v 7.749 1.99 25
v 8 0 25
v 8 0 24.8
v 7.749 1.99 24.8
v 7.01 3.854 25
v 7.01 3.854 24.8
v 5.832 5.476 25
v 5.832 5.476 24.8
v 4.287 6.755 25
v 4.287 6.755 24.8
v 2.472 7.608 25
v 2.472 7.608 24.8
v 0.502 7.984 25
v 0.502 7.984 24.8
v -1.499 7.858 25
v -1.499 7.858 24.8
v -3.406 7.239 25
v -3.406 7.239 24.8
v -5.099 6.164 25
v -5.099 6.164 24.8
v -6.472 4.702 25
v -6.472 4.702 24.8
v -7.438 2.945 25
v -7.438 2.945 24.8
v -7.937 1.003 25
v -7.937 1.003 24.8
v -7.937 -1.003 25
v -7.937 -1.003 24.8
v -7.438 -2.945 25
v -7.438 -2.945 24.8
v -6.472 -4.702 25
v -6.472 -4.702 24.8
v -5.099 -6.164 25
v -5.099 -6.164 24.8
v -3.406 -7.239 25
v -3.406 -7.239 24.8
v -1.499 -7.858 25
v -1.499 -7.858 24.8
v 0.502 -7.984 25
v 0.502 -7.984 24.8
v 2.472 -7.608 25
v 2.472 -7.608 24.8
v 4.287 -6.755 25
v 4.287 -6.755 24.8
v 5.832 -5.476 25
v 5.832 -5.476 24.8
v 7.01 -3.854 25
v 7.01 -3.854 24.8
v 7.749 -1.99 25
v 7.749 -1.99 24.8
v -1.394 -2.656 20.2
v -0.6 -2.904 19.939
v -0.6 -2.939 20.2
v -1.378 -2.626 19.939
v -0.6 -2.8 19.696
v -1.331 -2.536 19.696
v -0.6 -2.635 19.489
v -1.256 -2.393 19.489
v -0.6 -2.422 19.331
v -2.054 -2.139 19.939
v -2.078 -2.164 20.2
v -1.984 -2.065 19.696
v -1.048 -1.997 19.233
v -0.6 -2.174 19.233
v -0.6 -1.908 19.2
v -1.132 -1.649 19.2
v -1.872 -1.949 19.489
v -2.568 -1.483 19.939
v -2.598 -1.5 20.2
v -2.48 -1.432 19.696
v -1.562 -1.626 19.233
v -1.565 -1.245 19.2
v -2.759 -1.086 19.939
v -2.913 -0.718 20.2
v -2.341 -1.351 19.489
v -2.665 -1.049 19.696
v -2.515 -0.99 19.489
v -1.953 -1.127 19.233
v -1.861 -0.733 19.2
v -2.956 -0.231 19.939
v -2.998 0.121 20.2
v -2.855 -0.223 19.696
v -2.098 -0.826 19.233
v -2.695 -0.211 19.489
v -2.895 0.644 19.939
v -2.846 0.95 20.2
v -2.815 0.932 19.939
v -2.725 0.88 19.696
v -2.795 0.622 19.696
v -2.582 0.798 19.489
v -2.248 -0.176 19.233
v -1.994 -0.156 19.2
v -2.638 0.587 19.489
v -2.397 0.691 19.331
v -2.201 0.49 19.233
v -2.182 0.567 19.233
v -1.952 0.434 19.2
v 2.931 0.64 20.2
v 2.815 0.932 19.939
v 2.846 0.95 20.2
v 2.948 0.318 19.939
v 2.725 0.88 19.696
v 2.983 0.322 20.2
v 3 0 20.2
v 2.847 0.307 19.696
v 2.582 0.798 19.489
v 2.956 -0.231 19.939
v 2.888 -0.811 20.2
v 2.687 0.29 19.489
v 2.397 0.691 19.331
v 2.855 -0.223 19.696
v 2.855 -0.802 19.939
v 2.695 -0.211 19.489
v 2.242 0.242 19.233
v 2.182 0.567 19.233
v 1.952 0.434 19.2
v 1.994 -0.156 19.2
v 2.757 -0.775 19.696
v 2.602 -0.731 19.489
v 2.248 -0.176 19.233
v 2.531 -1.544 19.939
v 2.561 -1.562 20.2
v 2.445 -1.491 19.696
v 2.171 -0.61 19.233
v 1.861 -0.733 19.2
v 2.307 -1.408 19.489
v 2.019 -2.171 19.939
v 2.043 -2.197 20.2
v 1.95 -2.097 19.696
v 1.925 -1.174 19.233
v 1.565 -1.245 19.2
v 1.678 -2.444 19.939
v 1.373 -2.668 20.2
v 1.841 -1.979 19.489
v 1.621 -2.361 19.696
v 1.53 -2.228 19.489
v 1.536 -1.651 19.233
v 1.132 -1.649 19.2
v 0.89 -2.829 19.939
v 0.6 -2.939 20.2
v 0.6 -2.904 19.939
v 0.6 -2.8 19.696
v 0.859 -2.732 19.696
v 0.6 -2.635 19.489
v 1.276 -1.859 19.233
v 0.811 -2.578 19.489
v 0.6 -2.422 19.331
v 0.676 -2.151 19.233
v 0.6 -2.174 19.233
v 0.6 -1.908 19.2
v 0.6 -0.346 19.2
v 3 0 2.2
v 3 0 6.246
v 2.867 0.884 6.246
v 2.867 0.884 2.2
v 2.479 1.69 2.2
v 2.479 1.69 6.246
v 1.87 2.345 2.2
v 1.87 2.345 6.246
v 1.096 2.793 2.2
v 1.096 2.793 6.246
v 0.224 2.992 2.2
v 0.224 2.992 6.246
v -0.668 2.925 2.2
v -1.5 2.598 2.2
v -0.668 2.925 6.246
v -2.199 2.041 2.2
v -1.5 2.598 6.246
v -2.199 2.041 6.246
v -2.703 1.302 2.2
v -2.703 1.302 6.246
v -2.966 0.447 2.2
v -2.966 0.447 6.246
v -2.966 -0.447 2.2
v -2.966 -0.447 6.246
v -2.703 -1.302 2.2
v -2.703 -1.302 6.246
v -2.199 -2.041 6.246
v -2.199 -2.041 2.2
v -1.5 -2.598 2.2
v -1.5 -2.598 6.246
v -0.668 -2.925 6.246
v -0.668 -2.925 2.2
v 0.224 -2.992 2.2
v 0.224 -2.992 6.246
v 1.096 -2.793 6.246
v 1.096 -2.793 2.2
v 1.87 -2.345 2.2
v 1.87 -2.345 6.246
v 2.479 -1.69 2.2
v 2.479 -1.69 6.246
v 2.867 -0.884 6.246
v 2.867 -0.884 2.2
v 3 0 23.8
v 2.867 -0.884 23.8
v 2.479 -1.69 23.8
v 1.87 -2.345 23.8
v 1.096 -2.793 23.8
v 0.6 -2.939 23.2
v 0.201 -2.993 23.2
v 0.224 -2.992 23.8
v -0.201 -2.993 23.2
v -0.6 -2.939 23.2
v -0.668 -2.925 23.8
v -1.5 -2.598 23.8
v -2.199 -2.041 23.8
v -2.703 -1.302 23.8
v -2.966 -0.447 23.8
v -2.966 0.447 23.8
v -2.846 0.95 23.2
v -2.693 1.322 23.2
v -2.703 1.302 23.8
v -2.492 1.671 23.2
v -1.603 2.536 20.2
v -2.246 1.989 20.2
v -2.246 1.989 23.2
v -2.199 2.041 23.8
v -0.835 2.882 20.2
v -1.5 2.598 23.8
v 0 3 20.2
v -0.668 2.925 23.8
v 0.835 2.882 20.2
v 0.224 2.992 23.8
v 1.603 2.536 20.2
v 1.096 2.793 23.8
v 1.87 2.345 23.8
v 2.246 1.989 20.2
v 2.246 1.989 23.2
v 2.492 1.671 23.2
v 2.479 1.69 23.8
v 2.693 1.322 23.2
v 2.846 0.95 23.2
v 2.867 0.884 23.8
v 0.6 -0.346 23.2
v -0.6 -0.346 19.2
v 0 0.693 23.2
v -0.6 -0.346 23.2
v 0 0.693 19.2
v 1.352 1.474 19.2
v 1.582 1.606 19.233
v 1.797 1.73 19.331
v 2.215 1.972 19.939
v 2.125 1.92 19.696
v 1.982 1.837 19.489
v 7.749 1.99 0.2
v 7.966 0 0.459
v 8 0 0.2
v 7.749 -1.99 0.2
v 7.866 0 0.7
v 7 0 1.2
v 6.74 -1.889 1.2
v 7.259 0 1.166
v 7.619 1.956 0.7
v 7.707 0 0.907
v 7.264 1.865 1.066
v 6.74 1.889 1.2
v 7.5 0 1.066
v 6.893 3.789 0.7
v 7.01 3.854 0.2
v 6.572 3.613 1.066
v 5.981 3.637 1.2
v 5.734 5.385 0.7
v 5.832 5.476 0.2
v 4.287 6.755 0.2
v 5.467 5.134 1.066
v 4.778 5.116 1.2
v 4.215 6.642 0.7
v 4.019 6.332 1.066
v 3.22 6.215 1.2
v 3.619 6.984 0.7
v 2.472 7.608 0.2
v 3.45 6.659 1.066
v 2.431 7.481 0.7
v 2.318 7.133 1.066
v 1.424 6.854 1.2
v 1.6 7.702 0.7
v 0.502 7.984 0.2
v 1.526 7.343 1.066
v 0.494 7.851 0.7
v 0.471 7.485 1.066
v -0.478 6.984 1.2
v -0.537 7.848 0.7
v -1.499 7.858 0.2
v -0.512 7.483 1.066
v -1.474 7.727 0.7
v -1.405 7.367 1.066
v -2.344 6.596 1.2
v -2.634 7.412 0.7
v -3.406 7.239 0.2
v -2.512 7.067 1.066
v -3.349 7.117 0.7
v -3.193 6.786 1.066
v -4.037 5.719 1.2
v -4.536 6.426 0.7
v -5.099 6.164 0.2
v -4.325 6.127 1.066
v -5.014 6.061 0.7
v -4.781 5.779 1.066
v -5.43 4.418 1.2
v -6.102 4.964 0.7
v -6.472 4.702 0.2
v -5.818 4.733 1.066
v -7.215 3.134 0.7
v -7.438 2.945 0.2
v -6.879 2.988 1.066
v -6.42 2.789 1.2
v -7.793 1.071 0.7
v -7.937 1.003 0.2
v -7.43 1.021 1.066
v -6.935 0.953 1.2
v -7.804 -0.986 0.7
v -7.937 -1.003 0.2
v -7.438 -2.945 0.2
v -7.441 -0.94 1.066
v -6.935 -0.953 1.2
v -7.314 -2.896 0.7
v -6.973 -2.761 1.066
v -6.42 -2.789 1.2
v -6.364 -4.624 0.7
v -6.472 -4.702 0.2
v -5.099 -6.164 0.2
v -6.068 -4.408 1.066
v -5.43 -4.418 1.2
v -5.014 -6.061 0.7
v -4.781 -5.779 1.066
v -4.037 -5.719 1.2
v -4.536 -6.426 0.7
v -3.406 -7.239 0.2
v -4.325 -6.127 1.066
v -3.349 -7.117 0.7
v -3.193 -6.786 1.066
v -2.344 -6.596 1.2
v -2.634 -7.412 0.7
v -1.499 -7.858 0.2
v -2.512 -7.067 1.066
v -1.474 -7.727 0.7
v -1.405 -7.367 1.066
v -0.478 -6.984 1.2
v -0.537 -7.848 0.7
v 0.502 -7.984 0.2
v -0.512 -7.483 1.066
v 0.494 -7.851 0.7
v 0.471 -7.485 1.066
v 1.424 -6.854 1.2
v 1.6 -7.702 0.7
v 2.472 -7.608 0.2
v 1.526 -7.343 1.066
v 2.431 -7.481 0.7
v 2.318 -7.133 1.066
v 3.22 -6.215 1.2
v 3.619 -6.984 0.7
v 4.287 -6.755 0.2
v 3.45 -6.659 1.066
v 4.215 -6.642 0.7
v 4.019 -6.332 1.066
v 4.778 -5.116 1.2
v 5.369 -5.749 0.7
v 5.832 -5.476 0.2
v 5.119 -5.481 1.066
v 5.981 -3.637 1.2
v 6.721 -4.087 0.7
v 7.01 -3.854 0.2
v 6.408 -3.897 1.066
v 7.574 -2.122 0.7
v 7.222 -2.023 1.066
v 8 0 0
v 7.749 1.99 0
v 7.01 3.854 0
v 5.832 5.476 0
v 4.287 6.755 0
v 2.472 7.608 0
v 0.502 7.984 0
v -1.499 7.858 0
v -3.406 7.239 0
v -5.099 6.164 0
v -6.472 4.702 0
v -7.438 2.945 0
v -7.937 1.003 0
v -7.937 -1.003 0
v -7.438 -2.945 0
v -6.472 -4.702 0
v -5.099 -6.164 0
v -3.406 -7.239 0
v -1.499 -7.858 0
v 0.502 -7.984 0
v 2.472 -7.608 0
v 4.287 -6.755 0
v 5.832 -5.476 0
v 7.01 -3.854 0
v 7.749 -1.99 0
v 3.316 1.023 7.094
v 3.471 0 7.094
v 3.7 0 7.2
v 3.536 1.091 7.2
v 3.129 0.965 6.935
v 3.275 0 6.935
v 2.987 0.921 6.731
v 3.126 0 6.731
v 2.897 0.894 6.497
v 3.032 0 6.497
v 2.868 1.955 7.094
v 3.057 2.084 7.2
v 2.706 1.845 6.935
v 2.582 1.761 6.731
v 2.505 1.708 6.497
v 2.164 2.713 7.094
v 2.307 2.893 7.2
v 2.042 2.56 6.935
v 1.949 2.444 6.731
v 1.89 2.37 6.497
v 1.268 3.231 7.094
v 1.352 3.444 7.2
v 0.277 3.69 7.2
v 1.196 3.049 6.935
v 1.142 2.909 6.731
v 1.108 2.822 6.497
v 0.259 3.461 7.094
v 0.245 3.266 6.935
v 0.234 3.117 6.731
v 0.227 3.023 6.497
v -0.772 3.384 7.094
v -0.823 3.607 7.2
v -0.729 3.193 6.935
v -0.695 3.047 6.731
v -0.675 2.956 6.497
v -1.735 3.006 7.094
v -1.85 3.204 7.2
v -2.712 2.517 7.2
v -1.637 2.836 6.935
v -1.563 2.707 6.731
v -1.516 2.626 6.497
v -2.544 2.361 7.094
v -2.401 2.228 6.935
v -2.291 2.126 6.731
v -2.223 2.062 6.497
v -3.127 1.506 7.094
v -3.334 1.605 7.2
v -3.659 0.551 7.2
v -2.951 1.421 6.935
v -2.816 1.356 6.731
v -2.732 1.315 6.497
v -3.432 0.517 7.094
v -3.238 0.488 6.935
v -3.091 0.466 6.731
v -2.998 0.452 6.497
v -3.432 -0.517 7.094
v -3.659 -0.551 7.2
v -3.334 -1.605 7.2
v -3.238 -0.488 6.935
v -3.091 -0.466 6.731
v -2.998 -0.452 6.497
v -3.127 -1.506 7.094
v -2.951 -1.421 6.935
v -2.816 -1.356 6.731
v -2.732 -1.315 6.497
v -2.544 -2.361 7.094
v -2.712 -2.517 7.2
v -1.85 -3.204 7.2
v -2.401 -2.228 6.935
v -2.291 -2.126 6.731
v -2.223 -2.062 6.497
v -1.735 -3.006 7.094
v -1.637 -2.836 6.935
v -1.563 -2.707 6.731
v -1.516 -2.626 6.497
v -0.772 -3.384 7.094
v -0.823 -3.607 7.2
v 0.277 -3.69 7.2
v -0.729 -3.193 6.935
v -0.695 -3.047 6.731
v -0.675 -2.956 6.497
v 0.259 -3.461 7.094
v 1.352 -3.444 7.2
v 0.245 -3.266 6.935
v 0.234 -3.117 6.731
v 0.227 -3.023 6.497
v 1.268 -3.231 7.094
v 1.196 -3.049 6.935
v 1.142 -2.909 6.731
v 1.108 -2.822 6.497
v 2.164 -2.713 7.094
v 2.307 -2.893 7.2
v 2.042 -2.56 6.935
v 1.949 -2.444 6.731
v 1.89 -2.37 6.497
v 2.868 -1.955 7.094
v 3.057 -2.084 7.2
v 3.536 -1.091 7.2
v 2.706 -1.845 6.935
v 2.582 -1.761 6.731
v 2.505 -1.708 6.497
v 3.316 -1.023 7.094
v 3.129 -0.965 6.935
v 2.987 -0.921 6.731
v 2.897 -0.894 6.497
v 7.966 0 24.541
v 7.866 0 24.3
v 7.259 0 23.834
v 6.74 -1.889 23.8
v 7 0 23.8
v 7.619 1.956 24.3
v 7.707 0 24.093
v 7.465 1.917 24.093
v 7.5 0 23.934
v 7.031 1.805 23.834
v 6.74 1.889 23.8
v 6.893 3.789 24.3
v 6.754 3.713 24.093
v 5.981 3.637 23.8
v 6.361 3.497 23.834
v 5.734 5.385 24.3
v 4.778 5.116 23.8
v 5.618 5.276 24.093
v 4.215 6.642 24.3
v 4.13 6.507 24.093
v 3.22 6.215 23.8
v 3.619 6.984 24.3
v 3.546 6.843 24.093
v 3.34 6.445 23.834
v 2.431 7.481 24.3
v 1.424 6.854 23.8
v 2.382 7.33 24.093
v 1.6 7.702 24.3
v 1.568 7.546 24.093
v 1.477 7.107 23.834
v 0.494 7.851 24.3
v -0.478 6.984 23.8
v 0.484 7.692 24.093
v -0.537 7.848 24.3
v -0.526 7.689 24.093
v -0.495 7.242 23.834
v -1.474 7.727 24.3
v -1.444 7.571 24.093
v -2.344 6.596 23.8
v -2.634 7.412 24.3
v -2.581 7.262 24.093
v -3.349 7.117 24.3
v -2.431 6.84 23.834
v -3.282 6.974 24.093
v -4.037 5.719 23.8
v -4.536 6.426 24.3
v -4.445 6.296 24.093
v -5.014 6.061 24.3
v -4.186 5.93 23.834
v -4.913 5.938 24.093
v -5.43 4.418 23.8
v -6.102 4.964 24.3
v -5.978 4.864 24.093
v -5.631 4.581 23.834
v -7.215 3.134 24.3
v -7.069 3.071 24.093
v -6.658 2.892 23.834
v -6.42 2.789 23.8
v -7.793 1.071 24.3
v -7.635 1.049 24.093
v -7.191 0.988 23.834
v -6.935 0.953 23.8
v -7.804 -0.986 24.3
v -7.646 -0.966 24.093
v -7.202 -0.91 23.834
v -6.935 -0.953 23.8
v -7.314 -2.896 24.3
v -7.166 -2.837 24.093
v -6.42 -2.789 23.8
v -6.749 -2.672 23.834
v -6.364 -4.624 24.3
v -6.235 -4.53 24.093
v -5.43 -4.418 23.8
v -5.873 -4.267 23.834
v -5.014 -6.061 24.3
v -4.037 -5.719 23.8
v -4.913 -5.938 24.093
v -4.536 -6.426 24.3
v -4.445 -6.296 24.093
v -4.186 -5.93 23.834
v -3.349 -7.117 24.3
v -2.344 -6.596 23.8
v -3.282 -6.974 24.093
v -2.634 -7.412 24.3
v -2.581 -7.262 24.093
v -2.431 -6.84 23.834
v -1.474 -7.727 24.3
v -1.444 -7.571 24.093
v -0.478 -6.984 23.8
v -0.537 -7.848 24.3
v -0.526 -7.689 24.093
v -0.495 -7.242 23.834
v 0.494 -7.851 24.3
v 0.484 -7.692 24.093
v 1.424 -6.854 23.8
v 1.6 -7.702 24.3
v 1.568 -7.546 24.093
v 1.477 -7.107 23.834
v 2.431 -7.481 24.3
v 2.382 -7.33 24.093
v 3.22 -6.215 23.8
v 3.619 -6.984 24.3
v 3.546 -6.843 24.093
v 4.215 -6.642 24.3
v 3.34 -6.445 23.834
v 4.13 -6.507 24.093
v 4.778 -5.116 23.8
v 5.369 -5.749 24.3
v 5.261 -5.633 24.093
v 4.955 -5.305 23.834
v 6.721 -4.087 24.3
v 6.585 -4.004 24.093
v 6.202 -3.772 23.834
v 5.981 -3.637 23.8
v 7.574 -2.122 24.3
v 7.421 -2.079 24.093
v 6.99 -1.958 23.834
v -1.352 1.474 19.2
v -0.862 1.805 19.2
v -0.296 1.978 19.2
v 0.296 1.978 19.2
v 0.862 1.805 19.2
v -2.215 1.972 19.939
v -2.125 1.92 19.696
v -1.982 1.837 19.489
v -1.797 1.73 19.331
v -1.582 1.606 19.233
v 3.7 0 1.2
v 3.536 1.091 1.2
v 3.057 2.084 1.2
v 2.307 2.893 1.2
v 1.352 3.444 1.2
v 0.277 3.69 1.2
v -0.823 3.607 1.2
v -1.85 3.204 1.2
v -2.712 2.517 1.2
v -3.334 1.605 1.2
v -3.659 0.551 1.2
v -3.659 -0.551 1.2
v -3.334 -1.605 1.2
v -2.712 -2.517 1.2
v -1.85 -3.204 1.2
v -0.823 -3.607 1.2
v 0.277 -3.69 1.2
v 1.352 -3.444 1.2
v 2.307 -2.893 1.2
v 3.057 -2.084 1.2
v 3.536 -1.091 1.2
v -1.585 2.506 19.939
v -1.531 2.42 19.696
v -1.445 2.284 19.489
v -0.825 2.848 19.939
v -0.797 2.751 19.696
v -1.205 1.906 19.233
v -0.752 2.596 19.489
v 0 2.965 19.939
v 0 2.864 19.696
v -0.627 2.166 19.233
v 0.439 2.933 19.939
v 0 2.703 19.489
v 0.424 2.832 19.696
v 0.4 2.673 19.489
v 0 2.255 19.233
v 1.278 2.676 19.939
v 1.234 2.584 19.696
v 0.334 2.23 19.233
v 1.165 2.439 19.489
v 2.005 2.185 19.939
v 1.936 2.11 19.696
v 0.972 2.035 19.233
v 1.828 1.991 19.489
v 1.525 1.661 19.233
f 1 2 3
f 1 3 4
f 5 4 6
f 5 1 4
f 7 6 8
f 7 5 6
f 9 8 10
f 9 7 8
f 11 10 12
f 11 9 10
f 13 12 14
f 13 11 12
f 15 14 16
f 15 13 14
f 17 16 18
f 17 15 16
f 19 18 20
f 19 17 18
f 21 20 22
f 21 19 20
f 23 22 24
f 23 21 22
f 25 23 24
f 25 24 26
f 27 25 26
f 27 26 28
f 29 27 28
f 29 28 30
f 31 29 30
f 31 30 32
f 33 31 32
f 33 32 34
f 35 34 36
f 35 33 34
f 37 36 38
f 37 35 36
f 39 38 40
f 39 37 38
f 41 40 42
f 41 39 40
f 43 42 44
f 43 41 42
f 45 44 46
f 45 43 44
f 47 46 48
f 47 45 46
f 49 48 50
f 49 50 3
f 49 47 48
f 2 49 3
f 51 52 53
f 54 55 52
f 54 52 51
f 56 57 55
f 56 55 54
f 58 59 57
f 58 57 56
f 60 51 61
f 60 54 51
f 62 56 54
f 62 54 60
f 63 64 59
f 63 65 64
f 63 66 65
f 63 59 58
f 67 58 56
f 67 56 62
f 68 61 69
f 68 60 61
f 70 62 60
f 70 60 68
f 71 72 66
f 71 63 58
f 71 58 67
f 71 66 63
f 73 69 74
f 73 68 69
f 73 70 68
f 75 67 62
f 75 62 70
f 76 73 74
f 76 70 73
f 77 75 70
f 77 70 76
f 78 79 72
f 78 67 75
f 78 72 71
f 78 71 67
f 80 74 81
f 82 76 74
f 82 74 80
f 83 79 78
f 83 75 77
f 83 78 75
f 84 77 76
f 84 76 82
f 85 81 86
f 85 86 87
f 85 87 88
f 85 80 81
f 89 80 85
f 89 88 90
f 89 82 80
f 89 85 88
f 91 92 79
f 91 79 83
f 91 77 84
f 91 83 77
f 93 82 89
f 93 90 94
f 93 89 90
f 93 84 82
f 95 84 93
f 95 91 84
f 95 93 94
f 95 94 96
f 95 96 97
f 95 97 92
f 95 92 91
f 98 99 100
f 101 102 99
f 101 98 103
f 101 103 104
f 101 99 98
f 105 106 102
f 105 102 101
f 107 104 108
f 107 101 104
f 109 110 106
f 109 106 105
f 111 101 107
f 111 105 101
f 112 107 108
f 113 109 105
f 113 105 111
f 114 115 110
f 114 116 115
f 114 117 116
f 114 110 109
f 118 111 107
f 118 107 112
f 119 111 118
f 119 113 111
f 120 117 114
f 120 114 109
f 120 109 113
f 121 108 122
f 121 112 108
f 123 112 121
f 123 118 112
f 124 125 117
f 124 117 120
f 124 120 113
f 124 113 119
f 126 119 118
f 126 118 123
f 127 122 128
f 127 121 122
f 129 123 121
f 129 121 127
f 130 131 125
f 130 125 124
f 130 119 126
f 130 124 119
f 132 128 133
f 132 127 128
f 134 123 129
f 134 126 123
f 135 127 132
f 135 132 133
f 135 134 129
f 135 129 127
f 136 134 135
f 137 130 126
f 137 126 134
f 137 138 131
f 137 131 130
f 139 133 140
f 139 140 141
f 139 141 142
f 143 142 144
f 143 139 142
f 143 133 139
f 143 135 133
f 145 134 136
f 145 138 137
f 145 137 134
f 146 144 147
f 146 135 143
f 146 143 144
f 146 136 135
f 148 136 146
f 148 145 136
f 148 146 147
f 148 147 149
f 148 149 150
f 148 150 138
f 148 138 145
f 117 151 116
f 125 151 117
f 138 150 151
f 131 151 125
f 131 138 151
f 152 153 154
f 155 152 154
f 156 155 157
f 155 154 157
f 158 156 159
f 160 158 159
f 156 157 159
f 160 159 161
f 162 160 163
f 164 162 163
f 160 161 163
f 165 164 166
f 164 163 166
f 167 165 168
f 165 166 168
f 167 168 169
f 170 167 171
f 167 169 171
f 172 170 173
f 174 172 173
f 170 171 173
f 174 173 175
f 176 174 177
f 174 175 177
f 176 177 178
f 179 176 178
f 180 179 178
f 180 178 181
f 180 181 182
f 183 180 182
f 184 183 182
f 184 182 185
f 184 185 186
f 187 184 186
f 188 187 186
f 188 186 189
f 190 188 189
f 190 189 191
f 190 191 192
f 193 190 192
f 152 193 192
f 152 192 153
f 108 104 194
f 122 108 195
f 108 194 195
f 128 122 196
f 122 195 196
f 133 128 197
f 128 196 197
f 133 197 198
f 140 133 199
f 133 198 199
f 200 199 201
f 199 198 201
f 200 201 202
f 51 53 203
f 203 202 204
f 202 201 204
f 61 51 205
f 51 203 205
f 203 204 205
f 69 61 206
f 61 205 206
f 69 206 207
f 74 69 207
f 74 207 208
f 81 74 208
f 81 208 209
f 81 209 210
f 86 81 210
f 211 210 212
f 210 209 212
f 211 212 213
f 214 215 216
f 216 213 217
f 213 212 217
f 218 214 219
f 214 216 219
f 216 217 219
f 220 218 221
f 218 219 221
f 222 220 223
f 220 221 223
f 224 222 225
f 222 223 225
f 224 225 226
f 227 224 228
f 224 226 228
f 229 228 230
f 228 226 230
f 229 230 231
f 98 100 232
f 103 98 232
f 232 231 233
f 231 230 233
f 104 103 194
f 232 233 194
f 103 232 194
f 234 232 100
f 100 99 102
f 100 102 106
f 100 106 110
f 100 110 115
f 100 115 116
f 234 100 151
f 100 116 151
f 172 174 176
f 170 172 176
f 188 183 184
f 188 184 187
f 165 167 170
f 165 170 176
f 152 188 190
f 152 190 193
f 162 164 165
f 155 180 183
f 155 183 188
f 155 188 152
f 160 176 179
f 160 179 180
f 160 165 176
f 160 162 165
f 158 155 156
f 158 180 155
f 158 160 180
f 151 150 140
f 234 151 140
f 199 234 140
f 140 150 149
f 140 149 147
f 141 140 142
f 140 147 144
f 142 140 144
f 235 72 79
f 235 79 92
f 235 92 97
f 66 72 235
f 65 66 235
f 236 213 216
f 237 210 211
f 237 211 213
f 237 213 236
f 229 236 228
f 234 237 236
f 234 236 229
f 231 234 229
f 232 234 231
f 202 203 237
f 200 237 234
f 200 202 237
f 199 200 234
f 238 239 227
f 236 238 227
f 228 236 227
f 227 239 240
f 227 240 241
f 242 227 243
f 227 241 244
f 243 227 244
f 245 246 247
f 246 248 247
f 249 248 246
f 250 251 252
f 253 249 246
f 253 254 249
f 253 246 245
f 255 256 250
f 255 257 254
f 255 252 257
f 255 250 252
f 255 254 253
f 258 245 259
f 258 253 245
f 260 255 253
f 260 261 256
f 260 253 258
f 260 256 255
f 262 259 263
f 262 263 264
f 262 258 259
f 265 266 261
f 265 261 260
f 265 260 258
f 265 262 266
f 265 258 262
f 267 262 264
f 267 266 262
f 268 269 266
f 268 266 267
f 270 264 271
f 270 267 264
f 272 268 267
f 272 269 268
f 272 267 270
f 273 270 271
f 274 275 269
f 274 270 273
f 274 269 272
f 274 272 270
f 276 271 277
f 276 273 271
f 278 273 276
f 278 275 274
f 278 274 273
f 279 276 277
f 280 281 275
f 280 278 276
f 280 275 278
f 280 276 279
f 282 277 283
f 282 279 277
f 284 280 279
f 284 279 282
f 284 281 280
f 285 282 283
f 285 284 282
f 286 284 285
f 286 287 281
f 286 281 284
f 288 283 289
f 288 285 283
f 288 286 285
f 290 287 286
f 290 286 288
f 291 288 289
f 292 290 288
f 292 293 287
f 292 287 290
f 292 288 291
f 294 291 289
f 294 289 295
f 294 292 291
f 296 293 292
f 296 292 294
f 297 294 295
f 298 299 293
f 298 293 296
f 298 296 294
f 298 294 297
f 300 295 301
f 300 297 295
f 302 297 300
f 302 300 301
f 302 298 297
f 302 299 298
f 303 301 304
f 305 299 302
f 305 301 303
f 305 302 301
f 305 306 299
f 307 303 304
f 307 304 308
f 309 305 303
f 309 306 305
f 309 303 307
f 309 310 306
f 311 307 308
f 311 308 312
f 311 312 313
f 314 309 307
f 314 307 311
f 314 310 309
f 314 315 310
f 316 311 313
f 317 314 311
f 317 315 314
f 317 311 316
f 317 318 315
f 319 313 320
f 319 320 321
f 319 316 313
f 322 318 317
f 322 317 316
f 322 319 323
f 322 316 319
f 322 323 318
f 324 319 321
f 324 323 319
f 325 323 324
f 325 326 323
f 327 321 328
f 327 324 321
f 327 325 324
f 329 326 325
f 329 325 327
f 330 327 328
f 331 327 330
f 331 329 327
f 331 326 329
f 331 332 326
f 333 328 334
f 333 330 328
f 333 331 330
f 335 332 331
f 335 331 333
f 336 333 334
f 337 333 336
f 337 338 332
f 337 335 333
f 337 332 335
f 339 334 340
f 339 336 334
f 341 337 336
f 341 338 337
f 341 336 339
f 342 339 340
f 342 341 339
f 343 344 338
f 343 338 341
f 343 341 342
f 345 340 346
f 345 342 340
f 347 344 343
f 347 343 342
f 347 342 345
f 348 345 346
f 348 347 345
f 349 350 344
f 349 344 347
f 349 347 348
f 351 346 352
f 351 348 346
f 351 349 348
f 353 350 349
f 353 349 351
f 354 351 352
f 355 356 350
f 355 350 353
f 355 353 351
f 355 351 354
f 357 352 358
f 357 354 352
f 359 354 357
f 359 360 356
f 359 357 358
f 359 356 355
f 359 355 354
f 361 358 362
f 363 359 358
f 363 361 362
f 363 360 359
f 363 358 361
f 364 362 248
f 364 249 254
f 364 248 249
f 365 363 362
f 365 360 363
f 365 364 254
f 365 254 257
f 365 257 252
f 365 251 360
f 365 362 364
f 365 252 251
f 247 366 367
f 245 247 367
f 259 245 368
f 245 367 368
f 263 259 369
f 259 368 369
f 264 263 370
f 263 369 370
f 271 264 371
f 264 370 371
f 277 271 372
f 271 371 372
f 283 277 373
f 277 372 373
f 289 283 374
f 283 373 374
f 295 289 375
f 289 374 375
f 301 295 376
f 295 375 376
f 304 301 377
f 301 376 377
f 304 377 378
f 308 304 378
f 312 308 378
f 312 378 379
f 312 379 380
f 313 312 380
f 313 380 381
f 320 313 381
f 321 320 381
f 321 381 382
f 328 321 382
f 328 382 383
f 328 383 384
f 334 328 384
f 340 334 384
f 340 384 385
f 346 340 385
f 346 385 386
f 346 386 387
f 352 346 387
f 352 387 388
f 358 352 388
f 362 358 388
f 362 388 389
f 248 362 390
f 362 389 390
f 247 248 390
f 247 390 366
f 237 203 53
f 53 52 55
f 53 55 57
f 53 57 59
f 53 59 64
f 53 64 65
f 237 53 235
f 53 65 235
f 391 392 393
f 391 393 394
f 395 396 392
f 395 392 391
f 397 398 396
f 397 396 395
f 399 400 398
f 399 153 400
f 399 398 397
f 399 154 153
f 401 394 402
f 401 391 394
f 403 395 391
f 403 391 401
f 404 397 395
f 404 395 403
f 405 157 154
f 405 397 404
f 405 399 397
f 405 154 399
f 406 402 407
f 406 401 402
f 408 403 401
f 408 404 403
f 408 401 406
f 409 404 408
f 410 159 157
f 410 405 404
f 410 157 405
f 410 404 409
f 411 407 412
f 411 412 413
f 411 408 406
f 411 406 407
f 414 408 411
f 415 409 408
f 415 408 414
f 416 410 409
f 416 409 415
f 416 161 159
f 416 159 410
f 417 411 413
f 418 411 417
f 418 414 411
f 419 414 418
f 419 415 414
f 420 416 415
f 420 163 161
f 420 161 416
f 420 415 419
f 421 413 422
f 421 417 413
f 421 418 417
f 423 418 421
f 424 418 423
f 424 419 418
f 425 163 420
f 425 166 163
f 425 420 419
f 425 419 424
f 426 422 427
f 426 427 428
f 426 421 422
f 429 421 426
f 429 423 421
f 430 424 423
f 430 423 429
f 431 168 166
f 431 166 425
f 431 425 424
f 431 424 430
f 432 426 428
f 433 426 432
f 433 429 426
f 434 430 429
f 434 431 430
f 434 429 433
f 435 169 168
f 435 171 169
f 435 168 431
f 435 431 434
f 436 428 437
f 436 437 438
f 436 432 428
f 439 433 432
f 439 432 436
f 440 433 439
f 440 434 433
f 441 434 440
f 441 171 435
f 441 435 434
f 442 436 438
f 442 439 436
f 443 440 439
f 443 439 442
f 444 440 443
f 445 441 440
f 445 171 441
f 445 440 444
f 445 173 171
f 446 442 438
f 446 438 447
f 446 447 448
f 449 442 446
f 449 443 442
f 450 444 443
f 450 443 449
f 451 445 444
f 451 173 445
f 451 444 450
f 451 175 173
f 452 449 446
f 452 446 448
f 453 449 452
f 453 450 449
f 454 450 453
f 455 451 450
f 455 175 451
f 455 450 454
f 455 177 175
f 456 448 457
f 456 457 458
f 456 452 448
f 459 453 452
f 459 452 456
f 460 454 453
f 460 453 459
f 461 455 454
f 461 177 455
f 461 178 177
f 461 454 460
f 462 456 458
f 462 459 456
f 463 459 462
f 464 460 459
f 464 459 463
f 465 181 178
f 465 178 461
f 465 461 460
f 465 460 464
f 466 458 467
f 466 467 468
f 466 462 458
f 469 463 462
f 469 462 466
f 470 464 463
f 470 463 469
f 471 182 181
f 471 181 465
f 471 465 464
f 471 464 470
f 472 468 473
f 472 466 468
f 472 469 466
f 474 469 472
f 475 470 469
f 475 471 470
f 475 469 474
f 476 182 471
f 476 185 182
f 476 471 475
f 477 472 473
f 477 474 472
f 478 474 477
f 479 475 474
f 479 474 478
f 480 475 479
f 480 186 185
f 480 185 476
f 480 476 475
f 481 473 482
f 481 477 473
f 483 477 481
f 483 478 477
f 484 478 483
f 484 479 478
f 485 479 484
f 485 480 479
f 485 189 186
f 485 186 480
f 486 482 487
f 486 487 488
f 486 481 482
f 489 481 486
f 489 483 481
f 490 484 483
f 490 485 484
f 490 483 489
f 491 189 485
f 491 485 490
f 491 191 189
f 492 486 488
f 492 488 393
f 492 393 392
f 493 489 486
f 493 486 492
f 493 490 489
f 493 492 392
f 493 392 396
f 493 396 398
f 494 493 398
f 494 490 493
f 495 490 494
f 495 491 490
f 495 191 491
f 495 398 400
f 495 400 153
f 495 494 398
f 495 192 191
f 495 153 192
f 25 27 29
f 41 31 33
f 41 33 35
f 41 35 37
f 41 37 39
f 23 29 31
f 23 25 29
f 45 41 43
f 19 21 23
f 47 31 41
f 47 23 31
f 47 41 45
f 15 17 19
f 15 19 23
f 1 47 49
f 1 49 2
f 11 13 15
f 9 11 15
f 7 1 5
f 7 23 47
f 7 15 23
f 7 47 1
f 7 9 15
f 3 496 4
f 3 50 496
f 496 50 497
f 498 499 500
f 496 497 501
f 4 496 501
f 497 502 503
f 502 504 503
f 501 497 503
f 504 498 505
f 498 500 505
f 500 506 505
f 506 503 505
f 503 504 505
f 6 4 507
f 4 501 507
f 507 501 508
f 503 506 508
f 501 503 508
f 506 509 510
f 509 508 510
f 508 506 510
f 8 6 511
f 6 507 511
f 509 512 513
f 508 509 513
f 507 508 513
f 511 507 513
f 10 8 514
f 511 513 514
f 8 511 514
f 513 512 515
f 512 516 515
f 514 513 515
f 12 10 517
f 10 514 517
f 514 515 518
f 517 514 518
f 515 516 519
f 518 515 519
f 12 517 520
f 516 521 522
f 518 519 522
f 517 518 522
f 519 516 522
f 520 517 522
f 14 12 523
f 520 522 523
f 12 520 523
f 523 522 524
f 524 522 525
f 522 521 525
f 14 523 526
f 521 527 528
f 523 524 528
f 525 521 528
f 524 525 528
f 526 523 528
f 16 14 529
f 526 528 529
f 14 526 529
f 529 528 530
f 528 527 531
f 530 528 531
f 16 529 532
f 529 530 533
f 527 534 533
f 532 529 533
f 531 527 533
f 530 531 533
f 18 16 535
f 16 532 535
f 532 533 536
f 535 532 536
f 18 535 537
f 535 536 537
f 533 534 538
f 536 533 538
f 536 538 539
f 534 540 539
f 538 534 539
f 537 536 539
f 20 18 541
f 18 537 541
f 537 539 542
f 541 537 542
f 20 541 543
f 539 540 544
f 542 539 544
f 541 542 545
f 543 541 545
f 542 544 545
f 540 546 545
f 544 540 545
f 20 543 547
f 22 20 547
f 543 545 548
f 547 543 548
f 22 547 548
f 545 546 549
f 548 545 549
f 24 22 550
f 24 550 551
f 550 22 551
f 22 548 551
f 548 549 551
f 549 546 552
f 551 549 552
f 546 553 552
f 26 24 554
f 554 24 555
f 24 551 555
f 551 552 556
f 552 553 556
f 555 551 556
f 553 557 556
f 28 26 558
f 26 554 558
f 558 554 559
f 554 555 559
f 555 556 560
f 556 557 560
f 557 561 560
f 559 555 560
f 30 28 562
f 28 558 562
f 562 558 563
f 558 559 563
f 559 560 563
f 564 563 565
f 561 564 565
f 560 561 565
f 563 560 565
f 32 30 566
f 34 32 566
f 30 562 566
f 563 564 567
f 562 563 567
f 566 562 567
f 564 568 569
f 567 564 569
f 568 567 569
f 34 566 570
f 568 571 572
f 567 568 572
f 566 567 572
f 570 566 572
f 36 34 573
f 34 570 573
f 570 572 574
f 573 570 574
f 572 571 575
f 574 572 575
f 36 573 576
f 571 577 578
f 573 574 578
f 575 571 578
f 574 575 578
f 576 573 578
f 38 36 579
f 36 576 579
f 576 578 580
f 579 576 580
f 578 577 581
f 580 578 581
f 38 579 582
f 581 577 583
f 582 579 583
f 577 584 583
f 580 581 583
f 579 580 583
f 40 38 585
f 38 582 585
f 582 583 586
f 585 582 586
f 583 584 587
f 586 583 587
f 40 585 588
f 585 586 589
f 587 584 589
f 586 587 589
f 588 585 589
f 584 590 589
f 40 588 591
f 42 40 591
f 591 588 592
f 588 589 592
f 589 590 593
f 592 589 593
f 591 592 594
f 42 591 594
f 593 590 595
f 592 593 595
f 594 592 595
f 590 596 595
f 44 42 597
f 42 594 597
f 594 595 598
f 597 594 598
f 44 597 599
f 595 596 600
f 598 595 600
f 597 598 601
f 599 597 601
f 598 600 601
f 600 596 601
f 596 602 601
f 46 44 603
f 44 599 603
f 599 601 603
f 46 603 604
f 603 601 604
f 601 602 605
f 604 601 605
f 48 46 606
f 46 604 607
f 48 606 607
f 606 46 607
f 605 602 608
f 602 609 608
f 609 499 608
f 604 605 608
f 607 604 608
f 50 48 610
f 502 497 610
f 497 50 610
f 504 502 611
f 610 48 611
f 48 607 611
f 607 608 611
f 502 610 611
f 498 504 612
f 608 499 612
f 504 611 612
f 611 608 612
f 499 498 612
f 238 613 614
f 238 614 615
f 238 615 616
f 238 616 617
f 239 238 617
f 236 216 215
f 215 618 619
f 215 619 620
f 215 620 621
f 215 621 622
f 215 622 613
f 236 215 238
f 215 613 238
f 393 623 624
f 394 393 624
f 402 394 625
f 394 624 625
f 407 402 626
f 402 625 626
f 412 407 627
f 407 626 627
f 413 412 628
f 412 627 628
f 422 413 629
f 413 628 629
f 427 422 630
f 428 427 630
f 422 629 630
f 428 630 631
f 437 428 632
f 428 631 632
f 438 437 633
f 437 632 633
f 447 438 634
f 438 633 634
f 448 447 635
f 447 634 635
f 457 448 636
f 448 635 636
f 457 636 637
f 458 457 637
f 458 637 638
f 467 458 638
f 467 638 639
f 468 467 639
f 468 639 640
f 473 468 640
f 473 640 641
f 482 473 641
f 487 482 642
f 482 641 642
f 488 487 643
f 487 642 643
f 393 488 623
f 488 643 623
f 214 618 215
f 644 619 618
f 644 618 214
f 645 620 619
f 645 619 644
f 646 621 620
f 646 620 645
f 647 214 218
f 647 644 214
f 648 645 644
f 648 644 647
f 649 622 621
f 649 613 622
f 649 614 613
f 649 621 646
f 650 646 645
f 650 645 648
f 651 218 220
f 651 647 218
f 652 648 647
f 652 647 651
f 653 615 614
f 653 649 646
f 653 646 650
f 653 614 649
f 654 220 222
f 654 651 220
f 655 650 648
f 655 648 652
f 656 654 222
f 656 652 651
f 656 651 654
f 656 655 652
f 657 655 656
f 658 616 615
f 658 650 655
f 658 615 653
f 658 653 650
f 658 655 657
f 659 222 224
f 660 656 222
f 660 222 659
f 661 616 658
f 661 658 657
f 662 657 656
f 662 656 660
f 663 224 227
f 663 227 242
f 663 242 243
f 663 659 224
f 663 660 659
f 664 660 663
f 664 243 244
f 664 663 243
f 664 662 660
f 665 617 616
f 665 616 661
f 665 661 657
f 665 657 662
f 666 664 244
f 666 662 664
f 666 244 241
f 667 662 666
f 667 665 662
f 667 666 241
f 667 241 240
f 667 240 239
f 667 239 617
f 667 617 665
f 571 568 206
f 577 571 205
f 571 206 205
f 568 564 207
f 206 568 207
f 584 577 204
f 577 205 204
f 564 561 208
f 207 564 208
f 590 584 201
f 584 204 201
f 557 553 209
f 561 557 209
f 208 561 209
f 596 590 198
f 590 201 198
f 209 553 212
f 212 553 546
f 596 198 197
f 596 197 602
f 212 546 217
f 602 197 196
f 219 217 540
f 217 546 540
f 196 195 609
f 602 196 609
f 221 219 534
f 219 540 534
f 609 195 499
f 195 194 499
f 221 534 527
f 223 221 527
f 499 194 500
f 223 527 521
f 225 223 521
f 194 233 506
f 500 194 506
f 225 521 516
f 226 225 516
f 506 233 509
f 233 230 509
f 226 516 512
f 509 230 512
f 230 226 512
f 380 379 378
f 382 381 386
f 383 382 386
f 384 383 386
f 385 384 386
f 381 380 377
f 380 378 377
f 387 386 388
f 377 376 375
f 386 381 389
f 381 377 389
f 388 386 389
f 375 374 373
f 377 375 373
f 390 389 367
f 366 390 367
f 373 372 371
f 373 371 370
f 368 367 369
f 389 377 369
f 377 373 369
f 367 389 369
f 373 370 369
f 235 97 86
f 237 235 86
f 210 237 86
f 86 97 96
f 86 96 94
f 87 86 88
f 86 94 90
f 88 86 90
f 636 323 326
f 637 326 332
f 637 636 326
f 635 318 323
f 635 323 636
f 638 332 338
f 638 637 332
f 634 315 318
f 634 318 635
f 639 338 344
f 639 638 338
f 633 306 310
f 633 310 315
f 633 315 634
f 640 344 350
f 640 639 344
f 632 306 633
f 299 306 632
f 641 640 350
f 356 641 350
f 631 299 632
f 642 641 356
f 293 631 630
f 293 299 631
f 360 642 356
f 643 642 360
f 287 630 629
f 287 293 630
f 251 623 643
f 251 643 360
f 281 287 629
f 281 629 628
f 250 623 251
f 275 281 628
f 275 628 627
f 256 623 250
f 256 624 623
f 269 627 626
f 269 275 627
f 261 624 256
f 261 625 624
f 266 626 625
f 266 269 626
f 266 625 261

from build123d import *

# Parameters (mm, degrees)
F0_R       = 8
F1_DEPTH   = 1.2
F2_R       = 3.7
F3_DEPTH   = 6
F4_R       = 3
F5_DEPTH   = 5
F7_R       = 8
F8_DEPTH   = 1.2
F9_R       = 3
F10_DEPTH  = 4.6
F11_R      = 0.6
F12_DEPTH  = 4
F13_2_F1_R = 1
F13_2_F2_R = 1
F13_2_F3_R = 1
F13_2_F4_R = 1


# Not quite as in the source:
# - a fillet or chamfer that OpenCascade refuses, or shapes differently, is made with other operations: its cross-section is extruded or revolved along the edge and cut away or added
# - a feature names something its author has since deleted; it is built from what else it names


with BuildPart() as f1:
    # F0 (on Top) → F1 (new body)
    with BuildSketch(Plane.XY):
        Circle(F0_R)
    extrude(amount=F1_DEPTH)

    # F2 (on face) → F3 (join)
    with BuildSketch(Plane.XY.offset(1.2)):
        Circle(F2_R)
    extrude(amount=F3_DEPTH)

    # F4 (on face) → F5 (cut)
    with BuildSketch(Plane.XY.offset(7.2)):
        Circle(F4_R)
    extrude(amount=-F5_DEPTH, mode=Mode.SUBTRACT)

    # F13: fillet of radius 1 on 2 edges, made by hand

    # F13_s1 → F13_t2 (revolve, cut)
    with BuildSketch(Plane.XZ):
        with BuildLine():
            ThreePointArc((3.7, 7.2), (3.1937742252, 6.8376687769), (3, 6.2460607986))
            Line((3, 6.2460607986), (3, 7.2))
            Line((3, 7.2), (3.7, 7.2))
        make_face()
    revolve(axis=Axis((0, 0, 7.2), (0, 0, 1)), mode=Mode.SUBTRACT)

    # F13_s3 → F13_t4 (revolve, cut)
    with BuildSketch(Plane.XZ):
        with BuildLine():
            ThreePointArc((8, 0.2), (7.7071067812, 0.9071067812), (7, 1.2))
            Line((7, 1.2), (8, 1.2))
            Line((8, 1.2), (8, 0.2))
        make_face()
    revolve(axis=Axis((0, 0, 1.2), (0, 0, 1)), mode=Mode.SUBTRACT)


with BuildPart() as f8:
    # F7 (on offset) → F8 (new body)
    with BuildSketch(Plane.XY.offset(25)):
        Circle(F7_R)
    extrude(amount=-F8_DEPTH)

    # F9 (on face) → F10 (join)
    with BuildSketch(Plane(origin=(0, 0, 23.8), x_dir=(1, 0, 0), z_dir=(0, 0, -1))):
        Circle(F9_R)
    extrude(amount=F10_DEPTH)

    # F11 (on face) → F12 (cut)
    with BuildSketch(Plane(origin=(0, 0, 19.2), x_dir=(1, 0, 0), z_dir=(0, 0, -1))):
        with BuildLine():
            Line((2.8455844123, -0.9500786034), (0.6, 0.3464101615))
            Line((0.6, 0.3464101615), (0.6, 2.9393876913))
            ThreePointArc((0.6, 2.9393876913), (0, 3), (-0.6, 2.9393876913))
            Line((-0.6, 2.9393876913), (-0.6, 0.3464101615))
            Line((-0.6, 0.3464101615), (-2.8455844123, -0.9500786034))
            ThreePointArc((-2.8455844123, -0.9500786034), (-2.5980762114, -1.5), (-2.2455844123, -1.9893090879))
            Line((-2.2455844123, -1.9893090879), (0, -0.692820323))
            Line((0, -0.692820323), (2.2455844123, -1.9893090879))
            ThreePointArc((2.2455844123, -1.9893090879), (2.5980762114, -1.5), (2.8455844123, -0.9500786034))
        make_face()
        Circle(F11_R, mode=Mode.SUBTRACT)
        Circle(F11_R)
    extrude(amount=-F12_DEPTH, mode=Mode.SUBTRACT)

    # F13#2: fillet of radius 1 on 5 edges, made by hand

    # F13_2_f1
    f13_2_f1_edges = [f8.edges().sort_by_distance(p)[0] for p in [
        (-8, 0, 23.8),
    ]]
    fillet(f13_2_f1_edges, radius=F13_2_F1_R)

    # F13_2_f2
    f13_2_f2_edges = [f8.edges().sort_by_distance(p)[0] for p in [
        (2.9611444778, 0.4812726687, 19.2),
        (2.3237900077, -1.8973665961, 19.2),
    ]]
    fillet(f13_2_f2_edges, radius=F13_2_F2_R)

    # F13_2_f3
    f13_2_f3_edges = [f8.edges().sort_by_distance(p)[0] for p in [
        (0, 3, 19.2),
    ]]
    fillet(f13_2_f3_edges, radius=F13_2_F3_R)

    # F13_2_f4
    f13_2_f4_edges = [f8.edges().sort_by_distance(p)[0] for p in [
        (-2.5980762114, -1.5, 19.2),
    ]]
    fillet(f13_2_f4_edges, radius=F13_2_F4_R)


solid = Compound([f1.part, f8.part])
